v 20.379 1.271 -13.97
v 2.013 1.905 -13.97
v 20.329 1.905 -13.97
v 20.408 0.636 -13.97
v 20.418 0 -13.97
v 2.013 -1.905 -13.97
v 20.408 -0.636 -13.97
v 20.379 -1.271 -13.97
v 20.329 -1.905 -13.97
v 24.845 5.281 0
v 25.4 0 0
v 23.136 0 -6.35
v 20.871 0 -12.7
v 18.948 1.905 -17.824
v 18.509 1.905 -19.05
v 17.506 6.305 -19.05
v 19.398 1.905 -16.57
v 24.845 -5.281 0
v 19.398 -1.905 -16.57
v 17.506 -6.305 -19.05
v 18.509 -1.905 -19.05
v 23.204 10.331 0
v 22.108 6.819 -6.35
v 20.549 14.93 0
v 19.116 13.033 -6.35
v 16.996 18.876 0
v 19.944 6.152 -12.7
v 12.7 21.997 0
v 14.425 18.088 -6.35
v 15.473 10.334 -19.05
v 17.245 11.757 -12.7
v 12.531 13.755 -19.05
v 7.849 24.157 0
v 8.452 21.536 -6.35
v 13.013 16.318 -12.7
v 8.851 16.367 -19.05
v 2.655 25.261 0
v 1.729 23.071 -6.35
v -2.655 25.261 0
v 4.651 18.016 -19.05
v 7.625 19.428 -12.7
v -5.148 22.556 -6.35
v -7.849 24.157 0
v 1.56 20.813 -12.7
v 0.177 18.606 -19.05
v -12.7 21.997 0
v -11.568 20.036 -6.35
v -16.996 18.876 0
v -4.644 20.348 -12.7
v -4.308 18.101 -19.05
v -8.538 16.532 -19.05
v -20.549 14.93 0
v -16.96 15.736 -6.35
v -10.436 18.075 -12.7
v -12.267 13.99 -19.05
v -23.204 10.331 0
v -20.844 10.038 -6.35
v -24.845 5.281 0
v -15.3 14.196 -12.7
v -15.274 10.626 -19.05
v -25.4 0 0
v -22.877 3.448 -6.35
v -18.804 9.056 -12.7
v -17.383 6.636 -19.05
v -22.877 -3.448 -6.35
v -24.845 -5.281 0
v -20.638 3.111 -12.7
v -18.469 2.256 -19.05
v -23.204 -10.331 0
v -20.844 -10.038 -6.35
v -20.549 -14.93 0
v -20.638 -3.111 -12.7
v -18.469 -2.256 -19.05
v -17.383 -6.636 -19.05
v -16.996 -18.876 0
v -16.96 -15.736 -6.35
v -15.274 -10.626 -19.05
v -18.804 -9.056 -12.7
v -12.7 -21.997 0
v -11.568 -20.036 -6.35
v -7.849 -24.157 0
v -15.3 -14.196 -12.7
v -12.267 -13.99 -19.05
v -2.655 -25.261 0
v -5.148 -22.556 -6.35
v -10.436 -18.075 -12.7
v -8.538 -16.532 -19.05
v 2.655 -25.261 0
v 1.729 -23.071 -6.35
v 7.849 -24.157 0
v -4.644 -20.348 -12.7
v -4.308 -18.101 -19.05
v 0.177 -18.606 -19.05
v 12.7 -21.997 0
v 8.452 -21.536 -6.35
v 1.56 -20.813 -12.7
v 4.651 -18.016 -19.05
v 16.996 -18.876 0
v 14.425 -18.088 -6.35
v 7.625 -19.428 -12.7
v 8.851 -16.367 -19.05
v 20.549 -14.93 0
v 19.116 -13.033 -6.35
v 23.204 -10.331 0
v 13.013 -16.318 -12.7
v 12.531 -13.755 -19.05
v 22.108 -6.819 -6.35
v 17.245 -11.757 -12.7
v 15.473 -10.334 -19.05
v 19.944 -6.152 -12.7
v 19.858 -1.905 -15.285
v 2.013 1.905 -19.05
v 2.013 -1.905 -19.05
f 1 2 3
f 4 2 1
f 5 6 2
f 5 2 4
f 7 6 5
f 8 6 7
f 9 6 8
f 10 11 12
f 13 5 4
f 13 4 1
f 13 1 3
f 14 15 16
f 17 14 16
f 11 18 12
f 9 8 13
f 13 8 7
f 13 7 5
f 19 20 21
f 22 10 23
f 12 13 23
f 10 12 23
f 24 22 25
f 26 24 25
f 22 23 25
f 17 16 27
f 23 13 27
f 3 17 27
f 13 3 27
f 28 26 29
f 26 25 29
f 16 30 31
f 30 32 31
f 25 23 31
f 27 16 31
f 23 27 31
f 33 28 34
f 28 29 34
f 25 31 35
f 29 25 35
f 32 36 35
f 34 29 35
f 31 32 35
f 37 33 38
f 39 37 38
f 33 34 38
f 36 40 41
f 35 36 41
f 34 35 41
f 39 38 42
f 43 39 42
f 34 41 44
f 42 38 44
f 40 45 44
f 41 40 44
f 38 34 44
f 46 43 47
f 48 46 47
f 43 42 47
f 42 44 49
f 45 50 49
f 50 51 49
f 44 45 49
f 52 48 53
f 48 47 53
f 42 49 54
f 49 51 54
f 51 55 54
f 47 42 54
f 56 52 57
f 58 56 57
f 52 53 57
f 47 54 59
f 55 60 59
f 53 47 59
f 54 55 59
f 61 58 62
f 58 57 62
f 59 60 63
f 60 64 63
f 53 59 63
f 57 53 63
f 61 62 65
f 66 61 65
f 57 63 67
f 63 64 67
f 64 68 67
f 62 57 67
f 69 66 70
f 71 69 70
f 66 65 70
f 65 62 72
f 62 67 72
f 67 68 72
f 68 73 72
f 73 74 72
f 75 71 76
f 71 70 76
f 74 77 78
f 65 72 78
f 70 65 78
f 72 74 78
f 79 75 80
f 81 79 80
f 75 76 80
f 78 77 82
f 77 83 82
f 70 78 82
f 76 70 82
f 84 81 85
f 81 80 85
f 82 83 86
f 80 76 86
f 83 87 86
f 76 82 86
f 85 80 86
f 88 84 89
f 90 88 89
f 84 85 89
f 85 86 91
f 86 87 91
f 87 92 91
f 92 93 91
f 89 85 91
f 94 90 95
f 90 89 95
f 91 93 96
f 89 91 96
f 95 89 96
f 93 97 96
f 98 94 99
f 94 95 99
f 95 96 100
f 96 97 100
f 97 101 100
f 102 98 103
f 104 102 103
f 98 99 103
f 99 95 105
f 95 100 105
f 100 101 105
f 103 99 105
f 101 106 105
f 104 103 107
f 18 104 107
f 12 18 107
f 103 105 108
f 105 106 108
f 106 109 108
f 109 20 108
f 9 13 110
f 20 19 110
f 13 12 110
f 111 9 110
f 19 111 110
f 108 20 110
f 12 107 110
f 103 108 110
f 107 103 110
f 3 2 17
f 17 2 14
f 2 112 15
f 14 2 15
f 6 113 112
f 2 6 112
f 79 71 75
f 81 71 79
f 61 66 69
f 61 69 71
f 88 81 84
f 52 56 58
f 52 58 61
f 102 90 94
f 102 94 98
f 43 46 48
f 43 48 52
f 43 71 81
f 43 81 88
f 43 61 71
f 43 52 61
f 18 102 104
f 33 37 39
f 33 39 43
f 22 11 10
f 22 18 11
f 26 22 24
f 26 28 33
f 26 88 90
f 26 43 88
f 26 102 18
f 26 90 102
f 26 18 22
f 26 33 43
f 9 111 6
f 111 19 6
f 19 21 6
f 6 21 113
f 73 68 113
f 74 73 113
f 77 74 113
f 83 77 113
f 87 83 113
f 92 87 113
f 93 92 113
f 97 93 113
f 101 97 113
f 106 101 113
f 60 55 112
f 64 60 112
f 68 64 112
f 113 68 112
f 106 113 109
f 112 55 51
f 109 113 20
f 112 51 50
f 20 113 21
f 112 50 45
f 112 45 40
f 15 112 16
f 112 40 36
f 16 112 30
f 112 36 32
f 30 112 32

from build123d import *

# Parameters (mm, degrees)
F0_R     = 25.4
F3_R     = 18.6067290317
F8_DEPTH = 5.08
F9_DEPTH = 5.08


# Not quite as in the source:
# - a feature of the source that left no trace in its solid (it failed there, or was rolled back) is left out


with BuildPart() as f4:
    # F0 (on Top) → F4 section 0
    with BuildSketch(Plane.XY):
        Circle(F0_R)
    # F3 (on plane+point) → F4 section 1
    with BuildSketch(Plane.XY.offset(-19.05)):
        Circle(F3_R)
    loft()

    # F5 (on face) → F8 (cut)
    with BuildSketch(Plane(origin=(0, 0, -19.05), x_dir=(1, 0, 0), z_dir=(0, 0, -1))):
        with BuildLine():
            Line((18.5089529757, 1.905), (2.0125971848, 1.905))
            Line((2.0125971848, 1.905), (2.0125971848, 0))
            Line((2.0125971848, 0), (2.0125971848, -1.905))
            Line((2.0125971848, -1.905), (18.5089529757, -1.905))
            ThreePointArc((18.5089529757, -1.905), (18.5822689403, -0.9537537886), (18.6067290317, 0))
            ThreePointArc((18.6067290317, 0), (18.5822689403, 0.9537537886), (18.5089529757, 1.905))
        make_face()
    extrude(amount=-F8_DEPTH, mode=Mode.SUBTRACT)

    # F5 (on face) → F9 (cut)
    with BuildSketch(Plane(origin=(0, 0, -19.05), x_dir=(1, 0, 0), z_dir=(0, 0, -1))):
        with BuildLine():
            Line((26.4462942035, 1.905), (18.5089529757, 1.905))
            ThreePointArc((18.5089529757, 1.905), (18.5822689403, 0.9537537886), (18.6067290317, 0))
            ThreePointArc((18.6067290317, 0), (18.5822689403, -0.9537537886), (18.5089529757, -1.905))
            Line((18.5089529757, -1.905), (26.4462942035, -1.905))
            Line((26.4462942035, -1.905), (26.4462942035, 1.905))
        make_face()
    extrude(amount=-F9_DEPTH, mode=Mode.SUBTRACT)


solid = f4.part
